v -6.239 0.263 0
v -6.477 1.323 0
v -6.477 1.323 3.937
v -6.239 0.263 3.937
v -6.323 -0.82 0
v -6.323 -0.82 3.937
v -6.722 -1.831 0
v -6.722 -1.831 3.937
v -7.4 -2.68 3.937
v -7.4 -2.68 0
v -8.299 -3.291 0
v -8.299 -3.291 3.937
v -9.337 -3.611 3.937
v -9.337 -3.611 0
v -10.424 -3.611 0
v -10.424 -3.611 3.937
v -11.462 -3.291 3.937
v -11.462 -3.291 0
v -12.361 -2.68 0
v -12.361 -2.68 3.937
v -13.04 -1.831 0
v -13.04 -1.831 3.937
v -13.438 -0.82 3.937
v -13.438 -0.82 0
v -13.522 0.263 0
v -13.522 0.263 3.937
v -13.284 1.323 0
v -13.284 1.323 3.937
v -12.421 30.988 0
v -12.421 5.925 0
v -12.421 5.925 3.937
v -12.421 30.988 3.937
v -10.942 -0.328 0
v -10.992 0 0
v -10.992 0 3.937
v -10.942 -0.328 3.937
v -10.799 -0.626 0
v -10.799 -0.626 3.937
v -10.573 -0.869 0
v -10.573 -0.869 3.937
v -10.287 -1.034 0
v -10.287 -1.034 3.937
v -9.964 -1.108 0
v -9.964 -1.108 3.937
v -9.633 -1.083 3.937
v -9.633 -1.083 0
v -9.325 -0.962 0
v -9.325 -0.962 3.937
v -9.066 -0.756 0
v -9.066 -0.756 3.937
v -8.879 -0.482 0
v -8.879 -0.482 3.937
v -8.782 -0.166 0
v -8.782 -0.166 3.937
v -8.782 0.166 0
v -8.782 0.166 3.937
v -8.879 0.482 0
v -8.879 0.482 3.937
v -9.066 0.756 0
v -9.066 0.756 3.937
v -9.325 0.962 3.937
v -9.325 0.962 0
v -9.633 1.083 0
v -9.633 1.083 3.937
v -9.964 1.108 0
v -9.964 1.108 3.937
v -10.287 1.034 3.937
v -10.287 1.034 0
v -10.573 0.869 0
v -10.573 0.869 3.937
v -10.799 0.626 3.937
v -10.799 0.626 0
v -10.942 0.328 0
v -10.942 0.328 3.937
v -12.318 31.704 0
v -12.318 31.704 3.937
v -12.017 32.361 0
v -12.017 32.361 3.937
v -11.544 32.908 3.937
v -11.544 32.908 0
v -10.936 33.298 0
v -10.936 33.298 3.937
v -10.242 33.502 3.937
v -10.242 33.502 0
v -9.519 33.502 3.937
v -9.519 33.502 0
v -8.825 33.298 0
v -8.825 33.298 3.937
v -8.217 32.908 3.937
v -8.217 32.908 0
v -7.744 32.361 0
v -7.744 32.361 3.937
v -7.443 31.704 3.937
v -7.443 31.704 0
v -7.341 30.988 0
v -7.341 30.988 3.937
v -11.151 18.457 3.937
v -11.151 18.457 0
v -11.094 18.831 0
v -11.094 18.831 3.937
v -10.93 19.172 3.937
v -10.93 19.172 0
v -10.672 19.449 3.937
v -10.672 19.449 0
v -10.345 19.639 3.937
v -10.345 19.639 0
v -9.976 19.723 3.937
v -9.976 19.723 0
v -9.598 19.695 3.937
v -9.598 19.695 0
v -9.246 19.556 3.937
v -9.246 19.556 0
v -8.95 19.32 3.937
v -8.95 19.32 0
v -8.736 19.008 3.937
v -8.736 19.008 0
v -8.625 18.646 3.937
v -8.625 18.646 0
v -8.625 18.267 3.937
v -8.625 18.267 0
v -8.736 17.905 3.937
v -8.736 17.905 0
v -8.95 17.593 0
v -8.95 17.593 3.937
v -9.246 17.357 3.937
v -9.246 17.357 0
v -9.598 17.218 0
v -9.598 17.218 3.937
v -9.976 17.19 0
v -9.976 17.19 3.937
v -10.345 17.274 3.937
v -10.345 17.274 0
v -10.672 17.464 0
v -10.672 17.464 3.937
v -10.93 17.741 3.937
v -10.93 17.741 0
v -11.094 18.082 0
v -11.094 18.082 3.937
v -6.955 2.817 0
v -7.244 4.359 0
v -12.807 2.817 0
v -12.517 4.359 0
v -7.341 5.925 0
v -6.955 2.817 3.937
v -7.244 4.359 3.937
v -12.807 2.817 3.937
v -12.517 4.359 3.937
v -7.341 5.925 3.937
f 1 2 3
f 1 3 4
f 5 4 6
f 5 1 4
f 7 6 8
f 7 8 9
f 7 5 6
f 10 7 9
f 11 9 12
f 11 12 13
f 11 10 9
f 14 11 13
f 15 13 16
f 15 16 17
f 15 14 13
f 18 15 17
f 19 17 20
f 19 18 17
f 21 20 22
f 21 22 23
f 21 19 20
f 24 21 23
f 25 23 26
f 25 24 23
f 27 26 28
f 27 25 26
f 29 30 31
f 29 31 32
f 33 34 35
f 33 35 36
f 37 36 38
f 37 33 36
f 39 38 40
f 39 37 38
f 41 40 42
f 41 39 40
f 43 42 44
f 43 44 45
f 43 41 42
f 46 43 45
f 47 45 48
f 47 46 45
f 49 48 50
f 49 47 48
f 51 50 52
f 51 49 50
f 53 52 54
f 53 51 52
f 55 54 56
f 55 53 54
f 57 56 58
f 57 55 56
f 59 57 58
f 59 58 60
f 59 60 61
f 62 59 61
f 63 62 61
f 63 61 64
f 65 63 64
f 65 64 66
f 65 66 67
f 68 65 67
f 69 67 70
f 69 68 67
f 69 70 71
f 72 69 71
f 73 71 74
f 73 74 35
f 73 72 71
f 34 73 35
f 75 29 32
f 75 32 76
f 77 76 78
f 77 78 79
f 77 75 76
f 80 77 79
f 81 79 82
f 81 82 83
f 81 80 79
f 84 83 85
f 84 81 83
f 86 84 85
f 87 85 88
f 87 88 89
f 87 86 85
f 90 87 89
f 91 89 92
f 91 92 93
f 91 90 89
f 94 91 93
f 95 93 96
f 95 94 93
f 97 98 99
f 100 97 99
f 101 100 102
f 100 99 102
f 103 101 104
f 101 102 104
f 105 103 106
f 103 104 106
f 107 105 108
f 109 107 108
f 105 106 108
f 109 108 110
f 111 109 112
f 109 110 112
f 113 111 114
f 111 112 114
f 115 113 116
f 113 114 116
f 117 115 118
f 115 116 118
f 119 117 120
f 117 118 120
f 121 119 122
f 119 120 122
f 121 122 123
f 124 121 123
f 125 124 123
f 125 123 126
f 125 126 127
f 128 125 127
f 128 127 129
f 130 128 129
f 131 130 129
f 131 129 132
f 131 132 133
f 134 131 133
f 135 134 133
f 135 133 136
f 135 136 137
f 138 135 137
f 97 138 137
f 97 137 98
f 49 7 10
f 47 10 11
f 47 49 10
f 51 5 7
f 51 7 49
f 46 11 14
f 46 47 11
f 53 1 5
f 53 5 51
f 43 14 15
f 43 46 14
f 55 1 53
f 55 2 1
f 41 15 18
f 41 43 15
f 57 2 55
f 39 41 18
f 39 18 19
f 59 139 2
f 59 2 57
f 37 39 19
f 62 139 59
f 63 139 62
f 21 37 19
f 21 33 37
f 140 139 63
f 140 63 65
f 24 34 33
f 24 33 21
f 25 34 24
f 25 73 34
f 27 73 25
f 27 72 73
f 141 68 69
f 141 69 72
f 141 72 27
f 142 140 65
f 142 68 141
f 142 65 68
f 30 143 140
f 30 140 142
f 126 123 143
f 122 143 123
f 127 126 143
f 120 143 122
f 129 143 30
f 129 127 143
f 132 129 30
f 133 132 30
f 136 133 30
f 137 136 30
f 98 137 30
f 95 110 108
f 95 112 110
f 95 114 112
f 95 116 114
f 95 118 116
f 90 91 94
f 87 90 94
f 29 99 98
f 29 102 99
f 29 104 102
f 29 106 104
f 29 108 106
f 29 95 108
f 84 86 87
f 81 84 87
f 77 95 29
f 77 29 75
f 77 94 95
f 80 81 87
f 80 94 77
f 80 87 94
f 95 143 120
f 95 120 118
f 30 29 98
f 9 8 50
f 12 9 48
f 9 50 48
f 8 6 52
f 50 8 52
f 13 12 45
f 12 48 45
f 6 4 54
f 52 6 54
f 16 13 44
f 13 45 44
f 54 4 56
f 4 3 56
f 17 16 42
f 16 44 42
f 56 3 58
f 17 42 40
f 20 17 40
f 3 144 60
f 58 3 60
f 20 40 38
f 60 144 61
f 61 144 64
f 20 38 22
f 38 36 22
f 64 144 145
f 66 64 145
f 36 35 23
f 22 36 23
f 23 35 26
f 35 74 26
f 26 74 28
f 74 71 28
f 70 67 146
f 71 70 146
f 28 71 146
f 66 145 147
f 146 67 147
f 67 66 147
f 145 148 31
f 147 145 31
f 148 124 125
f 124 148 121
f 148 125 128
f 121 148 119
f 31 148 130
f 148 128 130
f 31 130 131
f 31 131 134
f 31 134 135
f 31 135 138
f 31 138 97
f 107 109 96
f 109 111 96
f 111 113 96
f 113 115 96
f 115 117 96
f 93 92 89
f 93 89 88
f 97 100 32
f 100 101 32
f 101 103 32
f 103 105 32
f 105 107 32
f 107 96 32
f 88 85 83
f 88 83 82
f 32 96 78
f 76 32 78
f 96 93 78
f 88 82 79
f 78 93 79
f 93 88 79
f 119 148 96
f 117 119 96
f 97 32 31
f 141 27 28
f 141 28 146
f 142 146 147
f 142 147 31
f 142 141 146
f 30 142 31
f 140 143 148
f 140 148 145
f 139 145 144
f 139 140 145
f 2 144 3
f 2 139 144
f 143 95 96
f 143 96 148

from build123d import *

# Parameters (mm, degrees)
SKETCH1_R           = 1.11125
BOSS_EXTRUDE1_DEPTH = 3.937
SKETCH2_R           = 1.27
CUT_EXTRUDE1_DEPTH  = 37.36946133


with BuildPart() as part:
    # Sketch1 → Boss-Extrude1 (new body)
    with BuildSketch(Plane.XY):
        with BuildLine():
            Line((-7.3406, 30.988), (-7.3406, 5.92501279))
            ThreePointArc((-7.3406, 5.92501279), (-7.122958425, 3.583917287), (-6.477493204, 1.323061108))
            ThreePointArc((-6.477493204, 1.323061108), (-9.8806, -3.65125), (-13.283706796, 1.323061108))
            ThreePointArc((-13.283706796, 1.323061108), (-12.638241575, 3.583917287), (-12.4206, 5.92501279))
            Line((-12.4206, 5.92501279), (-12.4206, 30.988))
            ThreePointArc((-12.4206, 30.988), (-9.8806, 33.528), (-7.3406, 30.988))
        make_face()
        with Locations(Location((-9.8806, 0, 0), (0, 0, 180))):
            Circle(SKETCH1_R, mode=Mode.SUBTRACT)
    extrude(amount=BOSS_EXTRUDE1_DEPTH)

    # Sketch2 → Cut-Extrude1 (cut, through all)
    with BuildSketch(Plane(origin=(0, 0, 0), x_dir=(-1, 0, 0), z_dir=(0, 0, -1))):
        with Locations((9.8806, 18.456506395)):
            Circle(SKETCH2_R)
    extrude(amount=-CUT_EXTRUDE1_DEPTH, mode=Mode.SUBTRACT)


solid = part.part
